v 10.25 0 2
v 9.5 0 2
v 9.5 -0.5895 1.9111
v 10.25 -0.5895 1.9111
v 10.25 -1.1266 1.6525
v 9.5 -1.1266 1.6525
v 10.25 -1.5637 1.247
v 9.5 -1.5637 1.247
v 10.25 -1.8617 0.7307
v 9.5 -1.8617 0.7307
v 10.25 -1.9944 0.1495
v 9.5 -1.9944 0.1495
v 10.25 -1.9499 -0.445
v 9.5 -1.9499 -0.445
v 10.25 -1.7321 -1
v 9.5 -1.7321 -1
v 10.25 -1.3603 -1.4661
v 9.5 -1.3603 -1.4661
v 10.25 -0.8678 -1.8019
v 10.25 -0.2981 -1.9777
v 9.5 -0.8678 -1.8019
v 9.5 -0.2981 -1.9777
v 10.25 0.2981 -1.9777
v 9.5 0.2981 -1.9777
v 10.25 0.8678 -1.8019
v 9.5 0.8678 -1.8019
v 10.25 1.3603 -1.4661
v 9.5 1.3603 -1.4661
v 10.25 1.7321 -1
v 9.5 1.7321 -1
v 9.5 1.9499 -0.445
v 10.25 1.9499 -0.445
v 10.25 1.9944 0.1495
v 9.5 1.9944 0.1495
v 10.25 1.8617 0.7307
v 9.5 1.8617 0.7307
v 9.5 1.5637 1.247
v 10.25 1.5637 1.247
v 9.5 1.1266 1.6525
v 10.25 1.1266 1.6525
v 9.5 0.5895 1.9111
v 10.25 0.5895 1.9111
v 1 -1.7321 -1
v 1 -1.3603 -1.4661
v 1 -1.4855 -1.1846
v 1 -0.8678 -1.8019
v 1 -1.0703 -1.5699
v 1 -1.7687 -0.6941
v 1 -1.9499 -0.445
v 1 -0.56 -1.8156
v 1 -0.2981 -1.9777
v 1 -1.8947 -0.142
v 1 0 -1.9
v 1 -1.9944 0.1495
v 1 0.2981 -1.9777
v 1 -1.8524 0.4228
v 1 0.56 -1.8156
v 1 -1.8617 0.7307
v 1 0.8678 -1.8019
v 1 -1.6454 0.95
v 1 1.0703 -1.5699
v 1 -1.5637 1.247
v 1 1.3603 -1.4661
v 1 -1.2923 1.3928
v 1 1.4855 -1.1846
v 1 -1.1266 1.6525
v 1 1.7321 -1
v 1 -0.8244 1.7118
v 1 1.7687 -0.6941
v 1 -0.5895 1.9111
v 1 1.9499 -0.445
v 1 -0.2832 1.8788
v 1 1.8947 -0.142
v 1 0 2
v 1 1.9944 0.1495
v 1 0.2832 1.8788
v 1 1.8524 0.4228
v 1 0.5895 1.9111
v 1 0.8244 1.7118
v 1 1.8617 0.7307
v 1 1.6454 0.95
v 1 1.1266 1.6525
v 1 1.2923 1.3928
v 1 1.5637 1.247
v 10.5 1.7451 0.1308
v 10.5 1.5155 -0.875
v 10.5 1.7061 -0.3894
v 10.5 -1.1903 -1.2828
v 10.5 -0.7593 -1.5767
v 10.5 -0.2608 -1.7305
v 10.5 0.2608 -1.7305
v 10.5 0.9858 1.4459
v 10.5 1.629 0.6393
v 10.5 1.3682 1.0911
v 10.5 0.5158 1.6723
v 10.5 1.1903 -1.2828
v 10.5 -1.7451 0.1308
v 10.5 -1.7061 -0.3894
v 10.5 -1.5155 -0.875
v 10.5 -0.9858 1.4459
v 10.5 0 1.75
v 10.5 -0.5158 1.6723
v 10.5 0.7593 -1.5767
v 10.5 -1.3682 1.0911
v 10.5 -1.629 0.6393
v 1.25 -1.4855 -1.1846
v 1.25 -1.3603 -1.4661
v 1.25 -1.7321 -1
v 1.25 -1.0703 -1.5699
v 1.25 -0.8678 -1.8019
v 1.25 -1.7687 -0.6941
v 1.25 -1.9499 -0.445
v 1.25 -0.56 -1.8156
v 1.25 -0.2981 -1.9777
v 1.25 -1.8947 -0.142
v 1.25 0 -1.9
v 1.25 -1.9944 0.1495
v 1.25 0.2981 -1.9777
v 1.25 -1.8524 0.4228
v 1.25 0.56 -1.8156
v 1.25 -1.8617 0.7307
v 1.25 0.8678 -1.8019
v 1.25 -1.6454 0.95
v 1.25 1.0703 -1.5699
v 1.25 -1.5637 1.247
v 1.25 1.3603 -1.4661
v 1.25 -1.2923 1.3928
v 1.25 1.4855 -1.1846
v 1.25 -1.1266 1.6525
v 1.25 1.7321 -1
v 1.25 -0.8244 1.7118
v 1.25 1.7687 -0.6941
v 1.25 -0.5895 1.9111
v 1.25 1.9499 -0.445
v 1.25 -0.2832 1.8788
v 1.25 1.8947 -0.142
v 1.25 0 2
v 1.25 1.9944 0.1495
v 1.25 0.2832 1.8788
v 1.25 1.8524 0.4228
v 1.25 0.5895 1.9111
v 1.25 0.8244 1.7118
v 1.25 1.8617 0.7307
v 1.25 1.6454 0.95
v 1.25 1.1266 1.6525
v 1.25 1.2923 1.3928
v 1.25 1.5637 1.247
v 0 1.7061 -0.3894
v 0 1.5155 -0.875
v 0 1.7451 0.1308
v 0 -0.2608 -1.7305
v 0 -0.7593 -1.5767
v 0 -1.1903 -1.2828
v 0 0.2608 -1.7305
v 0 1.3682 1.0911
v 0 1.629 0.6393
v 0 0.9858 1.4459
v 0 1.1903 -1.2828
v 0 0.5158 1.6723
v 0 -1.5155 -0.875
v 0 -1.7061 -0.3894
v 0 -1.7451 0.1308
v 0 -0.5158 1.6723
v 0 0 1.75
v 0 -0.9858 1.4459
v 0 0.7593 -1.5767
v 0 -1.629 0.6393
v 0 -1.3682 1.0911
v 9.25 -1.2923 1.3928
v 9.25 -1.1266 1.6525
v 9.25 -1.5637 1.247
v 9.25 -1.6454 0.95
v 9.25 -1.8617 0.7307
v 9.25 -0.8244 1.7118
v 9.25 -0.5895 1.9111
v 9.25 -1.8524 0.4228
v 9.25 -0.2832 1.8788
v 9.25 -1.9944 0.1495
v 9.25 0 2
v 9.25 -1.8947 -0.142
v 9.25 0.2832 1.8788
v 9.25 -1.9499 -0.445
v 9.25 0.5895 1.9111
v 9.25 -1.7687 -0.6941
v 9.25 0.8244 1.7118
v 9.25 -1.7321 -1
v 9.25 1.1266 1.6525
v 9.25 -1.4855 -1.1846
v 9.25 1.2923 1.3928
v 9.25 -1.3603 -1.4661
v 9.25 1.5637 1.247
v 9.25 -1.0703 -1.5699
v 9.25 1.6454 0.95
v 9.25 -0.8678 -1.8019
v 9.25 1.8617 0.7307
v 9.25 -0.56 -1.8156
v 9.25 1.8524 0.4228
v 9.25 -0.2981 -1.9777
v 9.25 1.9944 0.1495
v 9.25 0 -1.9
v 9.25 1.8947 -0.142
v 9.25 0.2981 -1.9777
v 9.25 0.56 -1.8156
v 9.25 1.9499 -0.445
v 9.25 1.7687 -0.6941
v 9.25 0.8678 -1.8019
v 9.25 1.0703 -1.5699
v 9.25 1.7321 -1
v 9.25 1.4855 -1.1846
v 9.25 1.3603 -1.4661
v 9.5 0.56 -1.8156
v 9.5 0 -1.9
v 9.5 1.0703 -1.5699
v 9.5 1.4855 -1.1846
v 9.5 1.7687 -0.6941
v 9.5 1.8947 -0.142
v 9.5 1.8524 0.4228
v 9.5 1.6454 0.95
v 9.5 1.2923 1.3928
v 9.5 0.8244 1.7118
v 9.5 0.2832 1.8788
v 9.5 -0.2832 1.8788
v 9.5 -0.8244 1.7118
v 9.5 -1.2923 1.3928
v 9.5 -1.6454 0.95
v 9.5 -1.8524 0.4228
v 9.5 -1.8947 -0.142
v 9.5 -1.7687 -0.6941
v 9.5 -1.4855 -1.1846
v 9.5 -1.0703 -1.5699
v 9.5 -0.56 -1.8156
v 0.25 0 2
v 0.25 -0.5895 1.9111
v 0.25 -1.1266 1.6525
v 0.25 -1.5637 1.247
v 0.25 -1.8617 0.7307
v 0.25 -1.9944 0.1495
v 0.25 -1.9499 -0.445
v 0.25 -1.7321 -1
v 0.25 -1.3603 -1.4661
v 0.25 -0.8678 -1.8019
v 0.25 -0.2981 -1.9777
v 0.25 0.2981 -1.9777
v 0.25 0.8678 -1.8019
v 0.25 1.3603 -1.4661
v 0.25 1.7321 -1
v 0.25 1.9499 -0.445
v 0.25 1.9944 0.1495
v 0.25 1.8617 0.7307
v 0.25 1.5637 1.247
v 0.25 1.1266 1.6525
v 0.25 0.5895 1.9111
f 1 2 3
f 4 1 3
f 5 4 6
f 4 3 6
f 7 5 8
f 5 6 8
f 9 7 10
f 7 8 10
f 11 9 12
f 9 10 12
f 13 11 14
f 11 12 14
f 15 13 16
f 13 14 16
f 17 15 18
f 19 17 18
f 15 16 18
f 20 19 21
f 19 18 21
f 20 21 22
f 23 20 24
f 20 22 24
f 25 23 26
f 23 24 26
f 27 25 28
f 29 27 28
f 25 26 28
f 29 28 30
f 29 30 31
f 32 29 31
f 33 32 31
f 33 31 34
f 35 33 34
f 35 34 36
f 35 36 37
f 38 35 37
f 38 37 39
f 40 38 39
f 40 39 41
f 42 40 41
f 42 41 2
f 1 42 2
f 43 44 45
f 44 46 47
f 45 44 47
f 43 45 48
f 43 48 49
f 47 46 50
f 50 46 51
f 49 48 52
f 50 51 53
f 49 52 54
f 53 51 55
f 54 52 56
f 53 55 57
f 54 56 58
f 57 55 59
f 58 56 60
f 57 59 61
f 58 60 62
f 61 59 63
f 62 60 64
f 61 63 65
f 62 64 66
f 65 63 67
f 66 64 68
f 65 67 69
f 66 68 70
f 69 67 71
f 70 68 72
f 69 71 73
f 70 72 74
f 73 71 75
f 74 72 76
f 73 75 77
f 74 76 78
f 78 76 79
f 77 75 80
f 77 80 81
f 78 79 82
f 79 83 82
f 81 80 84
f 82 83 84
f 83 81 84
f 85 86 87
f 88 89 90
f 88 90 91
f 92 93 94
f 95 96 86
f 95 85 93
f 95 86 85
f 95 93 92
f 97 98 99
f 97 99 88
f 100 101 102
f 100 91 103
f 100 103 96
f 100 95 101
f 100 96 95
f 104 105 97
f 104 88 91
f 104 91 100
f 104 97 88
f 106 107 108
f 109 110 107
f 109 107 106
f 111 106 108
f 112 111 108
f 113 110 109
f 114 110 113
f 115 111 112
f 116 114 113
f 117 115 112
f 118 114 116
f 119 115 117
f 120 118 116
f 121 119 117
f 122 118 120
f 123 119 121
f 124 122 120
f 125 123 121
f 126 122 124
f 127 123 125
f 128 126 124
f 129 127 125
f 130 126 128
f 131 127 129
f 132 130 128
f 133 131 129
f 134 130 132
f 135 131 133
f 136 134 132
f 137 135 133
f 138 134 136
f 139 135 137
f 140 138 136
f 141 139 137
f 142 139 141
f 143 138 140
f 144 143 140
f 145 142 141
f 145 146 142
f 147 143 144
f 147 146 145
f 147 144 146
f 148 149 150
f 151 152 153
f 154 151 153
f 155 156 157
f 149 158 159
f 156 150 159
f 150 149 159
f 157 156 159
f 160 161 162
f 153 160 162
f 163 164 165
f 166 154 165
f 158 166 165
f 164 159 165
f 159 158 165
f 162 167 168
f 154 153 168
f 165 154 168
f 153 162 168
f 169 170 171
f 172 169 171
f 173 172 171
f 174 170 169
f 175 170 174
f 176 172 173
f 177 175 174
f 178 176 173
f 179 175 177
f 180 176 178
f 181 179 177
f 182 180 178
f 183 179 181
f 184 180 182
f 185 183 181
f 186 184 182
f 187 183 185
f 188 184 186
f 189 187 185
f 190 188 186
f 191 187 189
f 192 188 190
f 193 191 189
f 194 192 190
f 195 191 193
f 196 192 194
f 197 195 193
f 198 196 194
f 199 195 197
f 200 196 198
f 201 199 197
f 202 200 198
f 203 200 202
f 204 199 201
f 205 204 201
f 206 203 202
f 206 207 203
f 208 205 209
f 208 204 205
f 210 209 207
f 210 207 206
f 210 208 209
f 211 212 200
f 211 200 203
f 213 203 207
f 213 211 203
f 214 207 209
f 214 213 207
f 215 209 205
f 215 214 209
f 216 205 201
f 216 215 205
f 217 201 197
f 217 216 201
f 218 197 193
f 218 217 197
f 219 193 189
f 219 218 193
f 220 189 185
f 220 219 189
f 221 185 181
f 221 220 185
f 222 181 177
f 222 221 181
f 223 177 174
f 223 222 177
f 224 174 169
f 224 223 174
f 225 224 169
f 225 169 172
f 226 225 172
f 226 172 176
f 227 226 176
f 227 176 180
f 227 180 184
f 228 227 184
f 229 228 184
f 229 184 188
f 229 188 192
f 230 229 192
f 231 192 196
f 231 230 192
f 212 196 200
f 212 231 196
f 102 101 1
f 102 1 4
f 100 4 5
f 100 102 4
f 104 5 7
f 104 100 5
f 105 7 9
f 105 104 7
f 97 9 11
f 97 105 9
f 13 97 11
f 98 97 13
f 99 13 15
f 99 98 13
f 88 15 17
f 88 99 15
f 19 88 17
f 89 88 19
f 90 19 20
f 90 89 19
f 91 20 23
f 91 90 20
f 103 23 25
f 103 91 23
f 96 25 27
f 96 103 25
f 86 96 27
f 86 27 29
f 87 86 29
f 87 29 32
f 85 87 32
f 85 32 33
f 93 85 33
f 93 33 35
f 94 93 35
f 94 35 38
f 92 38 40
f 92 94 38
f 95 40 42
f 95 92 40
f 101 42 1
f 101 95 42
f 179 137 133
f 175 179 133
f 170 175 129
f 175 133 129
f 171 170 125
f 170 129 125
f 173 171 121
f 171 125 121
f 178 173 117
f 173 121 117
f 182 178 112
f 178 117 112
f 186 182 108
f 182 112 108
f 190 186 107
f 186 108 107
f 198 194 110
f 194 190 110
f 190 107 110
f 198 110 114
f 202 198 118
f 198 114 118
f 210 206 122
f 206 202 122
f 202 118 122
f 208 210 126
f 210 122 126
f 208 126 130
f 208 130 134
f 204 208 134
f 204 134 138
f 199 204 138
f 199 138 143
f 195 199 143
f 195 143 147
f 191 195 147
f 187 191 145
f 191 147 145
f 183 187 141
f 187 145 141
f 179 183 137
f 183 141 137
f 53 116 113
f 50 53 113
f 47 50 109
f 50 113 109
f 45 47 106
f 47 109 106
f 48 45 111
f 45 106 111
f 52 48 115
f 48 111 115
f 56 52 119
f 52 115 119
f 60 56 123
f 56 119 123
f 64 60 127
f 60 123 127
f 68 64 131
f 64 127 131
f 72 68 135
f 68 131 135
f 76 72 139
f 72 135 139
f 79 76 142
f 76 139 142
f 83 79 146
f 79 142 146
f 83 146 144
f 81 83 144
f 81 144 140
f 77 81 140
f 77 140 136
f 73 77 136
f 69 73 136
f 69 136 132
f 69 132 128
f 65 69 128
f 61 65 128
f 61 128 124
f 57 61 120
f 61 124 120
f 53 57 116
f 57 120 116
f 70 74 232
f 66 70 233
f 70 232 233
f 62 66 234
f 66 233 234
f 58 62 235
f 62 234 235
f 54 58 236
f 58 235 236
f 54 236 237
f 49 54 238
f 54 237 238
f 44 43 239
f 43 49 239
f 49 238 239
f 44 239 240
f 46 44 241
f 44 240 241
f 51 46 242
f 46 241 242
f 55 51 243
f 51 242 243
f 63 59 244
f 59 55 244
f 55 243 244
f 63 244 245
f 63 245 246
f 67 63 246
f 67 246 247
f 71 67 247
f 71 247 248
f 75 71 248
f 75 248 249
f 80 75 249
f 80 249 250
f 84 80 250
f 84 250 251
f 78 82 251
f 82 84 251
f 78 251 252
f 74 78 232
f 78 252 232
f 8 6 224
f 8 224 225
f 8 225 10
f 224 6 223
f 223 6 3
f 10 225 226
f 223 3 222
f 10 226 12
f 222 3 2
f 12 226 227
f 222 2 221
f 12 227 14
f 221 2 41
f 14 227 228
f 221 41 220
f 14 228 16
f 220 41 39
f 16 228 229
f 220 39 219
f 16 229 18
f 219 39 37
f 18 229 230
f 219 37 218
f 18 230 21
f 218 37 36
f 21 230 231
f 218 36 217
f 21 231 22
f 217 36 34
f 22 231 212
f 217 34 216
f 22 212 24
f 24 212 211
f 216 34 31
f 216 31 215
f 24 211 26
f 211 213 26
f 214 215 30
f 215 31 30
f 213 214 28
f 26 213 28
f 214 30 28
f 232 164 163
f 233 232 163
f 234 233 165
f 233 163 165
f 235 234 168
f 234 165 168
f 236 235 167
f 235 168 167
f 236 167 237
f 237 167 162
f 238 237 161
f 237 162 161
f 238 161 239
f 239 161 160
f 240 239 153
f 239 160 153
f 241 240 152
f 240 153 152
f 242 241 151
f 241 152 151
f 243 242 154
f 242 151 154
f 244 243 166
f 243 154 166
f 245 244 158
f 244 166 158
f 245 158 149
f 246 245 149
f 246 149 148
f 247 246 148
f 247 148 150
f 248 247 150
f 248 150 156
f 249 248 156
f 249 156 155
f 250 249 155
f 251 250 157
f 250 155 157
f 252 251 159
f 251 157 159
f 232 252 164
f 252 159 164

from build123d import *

# Parameters (mm, degrees)
SKETCH1_R           = 2
BOSS_EXTRUDE1_DEPTH = 10.5
CUT_EXTRUDE2_START  = -1
SKETCH2_R           = 2.498108329
SKETCH2_R_2         = 1.9
CUT_EXTRUDE2_DEPTH  = 0.25
CUT_EXTRUDE3_START  = -1.25
SKETCH3_R           = 2.5
SKETCH3_R_2         = 1.9
CUT_EXTRUDE3_DEPTH  = 0.25
CHAMFER1_SIZE       = 0.25


with BuildPart() as part:
    # Sketch1 → Boss-Extrude1 (new body)
    with BuildSketch(Plane(origin=(0, 0, 0), x_dir=(0, 0, -1), z_dir=(1, 0, 0))):
        with Locations(Location((0, 0, 0), (0, 0, 180))):
            Circle(SKETCH1_R)
    extrude(amount=BOSS_EXTRUDE1_DEPTH)

    # Sketch2 → Cut-Extrude2 (cut)
    with BuildSketch(Plane(origin=(10.5, 0, 0), x_dir=(0, 0, -1), z_dir=(1, 0, 0)).offset(CUT_EXTRUDE2_START)):
        Circle(SKETCH2_R)
        Circle(SKETCH2_R_2, mode=Mode.SUBTRACT)
    extrude(amount=-CUT_EXTRUDE2_DEPTH, mode=Mode.SUBTRACT)

    # Sketch3 → Cut-Extrude3 (cut)
    with BuildSketch(Plane.ZY.offset(CUT_EXTRUDE3_START)):
        Circle(SKETCH3_R)
        with Locations(Location((0, 0, 0), (0, 0, 180))):
            Circle(SKETCH3_R_2, mode=Mode.SUBTRACT)
    extrude(amount=CUT_EXTRUDE3_DEPTH, mode=Mode.SUBTRACT)

    # Chamfer1
    chamfer1_edges = [part.edges().sort_by_distance(p)[0] for p in [
        (0, 0, -2),
        (10.5, 0, -2),
    ]]
    chamfer(chamfer1_edges, length=CHAMFER1_SIZE)


solid = part.part
